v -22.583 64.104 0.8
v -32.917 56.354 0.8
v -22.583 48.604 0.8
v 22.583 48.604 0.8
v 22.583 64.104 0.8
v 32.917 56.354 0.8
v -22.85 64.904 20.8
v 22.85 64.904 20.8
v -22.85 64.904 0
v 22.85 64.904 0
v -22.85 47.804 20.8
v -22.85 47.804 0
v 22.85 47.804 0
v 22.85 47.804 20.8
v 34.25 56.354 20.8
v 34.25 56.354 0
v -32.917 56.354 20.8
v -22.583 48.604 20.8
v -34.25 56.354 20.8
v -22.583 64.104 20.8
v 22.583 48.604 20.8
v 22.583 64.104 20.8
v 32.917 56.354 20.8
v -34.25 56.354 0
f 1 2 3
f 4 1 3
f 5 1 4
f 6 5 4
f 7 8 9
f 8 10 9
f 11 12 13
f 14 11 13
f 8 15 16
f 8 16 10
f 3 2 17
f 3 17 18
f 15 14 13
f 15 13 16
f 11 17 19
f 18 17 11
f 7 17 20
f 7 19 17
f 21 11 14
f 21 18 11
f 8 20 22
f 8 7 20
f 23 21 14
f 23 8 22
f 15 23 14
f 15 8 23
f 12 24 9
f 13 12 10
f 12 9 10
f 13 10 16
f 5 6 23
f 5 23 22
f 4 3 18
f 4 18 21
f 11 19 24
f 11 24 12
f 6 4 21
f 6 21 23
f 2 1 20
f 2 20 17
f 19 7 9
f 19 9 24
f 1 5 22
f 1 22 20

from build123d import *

# Parameters (mm, degrees)
BOSS_EXTRU_1_DEPTH = 0.8
BOSS_EXTRU_2_DEPTH = 20


with BuildPart() as part:
    # Esquisse1 → Boss.-Extru.1 (new body)
    with BuildSketch(Plane.XY):
        Polygon((22.85, 64.904088569), (-22.85, 64.904088569), (-34.25, 56.354088569), (-22.85, 47.804088569), (22.85, 47.804088569), (34.25, 56.354088569), align=None)
    extrude(amount=BOSS_EXTRU_1_DEPTH)

    # Esquisse2 → Boss.-Extru.2 (add)
    with BuildSketch(Plane.XY.offset(0.8)):
        Polygon((34.25, 56.354088569), (22.85, 64.904088569), (-22.85, 64.904088569), (-34.25, 56.354088569), (-22.85, 47.804088569), (22.85, 47.804088569), align=None)
        Polygon((-22.583333333, 64.104088569), (-32.916666667, 56.354088569), (-22.583333333, 48.604088569), (22.583333333, 48.604088569), (32.916666667, 56.354088569), (22.583333333, 64.104088569), align=None, mode=Mode.SUBTRACT)
    extrude(amount=BOSS_EXTRU_2_DEPTH)


solid = part.part
